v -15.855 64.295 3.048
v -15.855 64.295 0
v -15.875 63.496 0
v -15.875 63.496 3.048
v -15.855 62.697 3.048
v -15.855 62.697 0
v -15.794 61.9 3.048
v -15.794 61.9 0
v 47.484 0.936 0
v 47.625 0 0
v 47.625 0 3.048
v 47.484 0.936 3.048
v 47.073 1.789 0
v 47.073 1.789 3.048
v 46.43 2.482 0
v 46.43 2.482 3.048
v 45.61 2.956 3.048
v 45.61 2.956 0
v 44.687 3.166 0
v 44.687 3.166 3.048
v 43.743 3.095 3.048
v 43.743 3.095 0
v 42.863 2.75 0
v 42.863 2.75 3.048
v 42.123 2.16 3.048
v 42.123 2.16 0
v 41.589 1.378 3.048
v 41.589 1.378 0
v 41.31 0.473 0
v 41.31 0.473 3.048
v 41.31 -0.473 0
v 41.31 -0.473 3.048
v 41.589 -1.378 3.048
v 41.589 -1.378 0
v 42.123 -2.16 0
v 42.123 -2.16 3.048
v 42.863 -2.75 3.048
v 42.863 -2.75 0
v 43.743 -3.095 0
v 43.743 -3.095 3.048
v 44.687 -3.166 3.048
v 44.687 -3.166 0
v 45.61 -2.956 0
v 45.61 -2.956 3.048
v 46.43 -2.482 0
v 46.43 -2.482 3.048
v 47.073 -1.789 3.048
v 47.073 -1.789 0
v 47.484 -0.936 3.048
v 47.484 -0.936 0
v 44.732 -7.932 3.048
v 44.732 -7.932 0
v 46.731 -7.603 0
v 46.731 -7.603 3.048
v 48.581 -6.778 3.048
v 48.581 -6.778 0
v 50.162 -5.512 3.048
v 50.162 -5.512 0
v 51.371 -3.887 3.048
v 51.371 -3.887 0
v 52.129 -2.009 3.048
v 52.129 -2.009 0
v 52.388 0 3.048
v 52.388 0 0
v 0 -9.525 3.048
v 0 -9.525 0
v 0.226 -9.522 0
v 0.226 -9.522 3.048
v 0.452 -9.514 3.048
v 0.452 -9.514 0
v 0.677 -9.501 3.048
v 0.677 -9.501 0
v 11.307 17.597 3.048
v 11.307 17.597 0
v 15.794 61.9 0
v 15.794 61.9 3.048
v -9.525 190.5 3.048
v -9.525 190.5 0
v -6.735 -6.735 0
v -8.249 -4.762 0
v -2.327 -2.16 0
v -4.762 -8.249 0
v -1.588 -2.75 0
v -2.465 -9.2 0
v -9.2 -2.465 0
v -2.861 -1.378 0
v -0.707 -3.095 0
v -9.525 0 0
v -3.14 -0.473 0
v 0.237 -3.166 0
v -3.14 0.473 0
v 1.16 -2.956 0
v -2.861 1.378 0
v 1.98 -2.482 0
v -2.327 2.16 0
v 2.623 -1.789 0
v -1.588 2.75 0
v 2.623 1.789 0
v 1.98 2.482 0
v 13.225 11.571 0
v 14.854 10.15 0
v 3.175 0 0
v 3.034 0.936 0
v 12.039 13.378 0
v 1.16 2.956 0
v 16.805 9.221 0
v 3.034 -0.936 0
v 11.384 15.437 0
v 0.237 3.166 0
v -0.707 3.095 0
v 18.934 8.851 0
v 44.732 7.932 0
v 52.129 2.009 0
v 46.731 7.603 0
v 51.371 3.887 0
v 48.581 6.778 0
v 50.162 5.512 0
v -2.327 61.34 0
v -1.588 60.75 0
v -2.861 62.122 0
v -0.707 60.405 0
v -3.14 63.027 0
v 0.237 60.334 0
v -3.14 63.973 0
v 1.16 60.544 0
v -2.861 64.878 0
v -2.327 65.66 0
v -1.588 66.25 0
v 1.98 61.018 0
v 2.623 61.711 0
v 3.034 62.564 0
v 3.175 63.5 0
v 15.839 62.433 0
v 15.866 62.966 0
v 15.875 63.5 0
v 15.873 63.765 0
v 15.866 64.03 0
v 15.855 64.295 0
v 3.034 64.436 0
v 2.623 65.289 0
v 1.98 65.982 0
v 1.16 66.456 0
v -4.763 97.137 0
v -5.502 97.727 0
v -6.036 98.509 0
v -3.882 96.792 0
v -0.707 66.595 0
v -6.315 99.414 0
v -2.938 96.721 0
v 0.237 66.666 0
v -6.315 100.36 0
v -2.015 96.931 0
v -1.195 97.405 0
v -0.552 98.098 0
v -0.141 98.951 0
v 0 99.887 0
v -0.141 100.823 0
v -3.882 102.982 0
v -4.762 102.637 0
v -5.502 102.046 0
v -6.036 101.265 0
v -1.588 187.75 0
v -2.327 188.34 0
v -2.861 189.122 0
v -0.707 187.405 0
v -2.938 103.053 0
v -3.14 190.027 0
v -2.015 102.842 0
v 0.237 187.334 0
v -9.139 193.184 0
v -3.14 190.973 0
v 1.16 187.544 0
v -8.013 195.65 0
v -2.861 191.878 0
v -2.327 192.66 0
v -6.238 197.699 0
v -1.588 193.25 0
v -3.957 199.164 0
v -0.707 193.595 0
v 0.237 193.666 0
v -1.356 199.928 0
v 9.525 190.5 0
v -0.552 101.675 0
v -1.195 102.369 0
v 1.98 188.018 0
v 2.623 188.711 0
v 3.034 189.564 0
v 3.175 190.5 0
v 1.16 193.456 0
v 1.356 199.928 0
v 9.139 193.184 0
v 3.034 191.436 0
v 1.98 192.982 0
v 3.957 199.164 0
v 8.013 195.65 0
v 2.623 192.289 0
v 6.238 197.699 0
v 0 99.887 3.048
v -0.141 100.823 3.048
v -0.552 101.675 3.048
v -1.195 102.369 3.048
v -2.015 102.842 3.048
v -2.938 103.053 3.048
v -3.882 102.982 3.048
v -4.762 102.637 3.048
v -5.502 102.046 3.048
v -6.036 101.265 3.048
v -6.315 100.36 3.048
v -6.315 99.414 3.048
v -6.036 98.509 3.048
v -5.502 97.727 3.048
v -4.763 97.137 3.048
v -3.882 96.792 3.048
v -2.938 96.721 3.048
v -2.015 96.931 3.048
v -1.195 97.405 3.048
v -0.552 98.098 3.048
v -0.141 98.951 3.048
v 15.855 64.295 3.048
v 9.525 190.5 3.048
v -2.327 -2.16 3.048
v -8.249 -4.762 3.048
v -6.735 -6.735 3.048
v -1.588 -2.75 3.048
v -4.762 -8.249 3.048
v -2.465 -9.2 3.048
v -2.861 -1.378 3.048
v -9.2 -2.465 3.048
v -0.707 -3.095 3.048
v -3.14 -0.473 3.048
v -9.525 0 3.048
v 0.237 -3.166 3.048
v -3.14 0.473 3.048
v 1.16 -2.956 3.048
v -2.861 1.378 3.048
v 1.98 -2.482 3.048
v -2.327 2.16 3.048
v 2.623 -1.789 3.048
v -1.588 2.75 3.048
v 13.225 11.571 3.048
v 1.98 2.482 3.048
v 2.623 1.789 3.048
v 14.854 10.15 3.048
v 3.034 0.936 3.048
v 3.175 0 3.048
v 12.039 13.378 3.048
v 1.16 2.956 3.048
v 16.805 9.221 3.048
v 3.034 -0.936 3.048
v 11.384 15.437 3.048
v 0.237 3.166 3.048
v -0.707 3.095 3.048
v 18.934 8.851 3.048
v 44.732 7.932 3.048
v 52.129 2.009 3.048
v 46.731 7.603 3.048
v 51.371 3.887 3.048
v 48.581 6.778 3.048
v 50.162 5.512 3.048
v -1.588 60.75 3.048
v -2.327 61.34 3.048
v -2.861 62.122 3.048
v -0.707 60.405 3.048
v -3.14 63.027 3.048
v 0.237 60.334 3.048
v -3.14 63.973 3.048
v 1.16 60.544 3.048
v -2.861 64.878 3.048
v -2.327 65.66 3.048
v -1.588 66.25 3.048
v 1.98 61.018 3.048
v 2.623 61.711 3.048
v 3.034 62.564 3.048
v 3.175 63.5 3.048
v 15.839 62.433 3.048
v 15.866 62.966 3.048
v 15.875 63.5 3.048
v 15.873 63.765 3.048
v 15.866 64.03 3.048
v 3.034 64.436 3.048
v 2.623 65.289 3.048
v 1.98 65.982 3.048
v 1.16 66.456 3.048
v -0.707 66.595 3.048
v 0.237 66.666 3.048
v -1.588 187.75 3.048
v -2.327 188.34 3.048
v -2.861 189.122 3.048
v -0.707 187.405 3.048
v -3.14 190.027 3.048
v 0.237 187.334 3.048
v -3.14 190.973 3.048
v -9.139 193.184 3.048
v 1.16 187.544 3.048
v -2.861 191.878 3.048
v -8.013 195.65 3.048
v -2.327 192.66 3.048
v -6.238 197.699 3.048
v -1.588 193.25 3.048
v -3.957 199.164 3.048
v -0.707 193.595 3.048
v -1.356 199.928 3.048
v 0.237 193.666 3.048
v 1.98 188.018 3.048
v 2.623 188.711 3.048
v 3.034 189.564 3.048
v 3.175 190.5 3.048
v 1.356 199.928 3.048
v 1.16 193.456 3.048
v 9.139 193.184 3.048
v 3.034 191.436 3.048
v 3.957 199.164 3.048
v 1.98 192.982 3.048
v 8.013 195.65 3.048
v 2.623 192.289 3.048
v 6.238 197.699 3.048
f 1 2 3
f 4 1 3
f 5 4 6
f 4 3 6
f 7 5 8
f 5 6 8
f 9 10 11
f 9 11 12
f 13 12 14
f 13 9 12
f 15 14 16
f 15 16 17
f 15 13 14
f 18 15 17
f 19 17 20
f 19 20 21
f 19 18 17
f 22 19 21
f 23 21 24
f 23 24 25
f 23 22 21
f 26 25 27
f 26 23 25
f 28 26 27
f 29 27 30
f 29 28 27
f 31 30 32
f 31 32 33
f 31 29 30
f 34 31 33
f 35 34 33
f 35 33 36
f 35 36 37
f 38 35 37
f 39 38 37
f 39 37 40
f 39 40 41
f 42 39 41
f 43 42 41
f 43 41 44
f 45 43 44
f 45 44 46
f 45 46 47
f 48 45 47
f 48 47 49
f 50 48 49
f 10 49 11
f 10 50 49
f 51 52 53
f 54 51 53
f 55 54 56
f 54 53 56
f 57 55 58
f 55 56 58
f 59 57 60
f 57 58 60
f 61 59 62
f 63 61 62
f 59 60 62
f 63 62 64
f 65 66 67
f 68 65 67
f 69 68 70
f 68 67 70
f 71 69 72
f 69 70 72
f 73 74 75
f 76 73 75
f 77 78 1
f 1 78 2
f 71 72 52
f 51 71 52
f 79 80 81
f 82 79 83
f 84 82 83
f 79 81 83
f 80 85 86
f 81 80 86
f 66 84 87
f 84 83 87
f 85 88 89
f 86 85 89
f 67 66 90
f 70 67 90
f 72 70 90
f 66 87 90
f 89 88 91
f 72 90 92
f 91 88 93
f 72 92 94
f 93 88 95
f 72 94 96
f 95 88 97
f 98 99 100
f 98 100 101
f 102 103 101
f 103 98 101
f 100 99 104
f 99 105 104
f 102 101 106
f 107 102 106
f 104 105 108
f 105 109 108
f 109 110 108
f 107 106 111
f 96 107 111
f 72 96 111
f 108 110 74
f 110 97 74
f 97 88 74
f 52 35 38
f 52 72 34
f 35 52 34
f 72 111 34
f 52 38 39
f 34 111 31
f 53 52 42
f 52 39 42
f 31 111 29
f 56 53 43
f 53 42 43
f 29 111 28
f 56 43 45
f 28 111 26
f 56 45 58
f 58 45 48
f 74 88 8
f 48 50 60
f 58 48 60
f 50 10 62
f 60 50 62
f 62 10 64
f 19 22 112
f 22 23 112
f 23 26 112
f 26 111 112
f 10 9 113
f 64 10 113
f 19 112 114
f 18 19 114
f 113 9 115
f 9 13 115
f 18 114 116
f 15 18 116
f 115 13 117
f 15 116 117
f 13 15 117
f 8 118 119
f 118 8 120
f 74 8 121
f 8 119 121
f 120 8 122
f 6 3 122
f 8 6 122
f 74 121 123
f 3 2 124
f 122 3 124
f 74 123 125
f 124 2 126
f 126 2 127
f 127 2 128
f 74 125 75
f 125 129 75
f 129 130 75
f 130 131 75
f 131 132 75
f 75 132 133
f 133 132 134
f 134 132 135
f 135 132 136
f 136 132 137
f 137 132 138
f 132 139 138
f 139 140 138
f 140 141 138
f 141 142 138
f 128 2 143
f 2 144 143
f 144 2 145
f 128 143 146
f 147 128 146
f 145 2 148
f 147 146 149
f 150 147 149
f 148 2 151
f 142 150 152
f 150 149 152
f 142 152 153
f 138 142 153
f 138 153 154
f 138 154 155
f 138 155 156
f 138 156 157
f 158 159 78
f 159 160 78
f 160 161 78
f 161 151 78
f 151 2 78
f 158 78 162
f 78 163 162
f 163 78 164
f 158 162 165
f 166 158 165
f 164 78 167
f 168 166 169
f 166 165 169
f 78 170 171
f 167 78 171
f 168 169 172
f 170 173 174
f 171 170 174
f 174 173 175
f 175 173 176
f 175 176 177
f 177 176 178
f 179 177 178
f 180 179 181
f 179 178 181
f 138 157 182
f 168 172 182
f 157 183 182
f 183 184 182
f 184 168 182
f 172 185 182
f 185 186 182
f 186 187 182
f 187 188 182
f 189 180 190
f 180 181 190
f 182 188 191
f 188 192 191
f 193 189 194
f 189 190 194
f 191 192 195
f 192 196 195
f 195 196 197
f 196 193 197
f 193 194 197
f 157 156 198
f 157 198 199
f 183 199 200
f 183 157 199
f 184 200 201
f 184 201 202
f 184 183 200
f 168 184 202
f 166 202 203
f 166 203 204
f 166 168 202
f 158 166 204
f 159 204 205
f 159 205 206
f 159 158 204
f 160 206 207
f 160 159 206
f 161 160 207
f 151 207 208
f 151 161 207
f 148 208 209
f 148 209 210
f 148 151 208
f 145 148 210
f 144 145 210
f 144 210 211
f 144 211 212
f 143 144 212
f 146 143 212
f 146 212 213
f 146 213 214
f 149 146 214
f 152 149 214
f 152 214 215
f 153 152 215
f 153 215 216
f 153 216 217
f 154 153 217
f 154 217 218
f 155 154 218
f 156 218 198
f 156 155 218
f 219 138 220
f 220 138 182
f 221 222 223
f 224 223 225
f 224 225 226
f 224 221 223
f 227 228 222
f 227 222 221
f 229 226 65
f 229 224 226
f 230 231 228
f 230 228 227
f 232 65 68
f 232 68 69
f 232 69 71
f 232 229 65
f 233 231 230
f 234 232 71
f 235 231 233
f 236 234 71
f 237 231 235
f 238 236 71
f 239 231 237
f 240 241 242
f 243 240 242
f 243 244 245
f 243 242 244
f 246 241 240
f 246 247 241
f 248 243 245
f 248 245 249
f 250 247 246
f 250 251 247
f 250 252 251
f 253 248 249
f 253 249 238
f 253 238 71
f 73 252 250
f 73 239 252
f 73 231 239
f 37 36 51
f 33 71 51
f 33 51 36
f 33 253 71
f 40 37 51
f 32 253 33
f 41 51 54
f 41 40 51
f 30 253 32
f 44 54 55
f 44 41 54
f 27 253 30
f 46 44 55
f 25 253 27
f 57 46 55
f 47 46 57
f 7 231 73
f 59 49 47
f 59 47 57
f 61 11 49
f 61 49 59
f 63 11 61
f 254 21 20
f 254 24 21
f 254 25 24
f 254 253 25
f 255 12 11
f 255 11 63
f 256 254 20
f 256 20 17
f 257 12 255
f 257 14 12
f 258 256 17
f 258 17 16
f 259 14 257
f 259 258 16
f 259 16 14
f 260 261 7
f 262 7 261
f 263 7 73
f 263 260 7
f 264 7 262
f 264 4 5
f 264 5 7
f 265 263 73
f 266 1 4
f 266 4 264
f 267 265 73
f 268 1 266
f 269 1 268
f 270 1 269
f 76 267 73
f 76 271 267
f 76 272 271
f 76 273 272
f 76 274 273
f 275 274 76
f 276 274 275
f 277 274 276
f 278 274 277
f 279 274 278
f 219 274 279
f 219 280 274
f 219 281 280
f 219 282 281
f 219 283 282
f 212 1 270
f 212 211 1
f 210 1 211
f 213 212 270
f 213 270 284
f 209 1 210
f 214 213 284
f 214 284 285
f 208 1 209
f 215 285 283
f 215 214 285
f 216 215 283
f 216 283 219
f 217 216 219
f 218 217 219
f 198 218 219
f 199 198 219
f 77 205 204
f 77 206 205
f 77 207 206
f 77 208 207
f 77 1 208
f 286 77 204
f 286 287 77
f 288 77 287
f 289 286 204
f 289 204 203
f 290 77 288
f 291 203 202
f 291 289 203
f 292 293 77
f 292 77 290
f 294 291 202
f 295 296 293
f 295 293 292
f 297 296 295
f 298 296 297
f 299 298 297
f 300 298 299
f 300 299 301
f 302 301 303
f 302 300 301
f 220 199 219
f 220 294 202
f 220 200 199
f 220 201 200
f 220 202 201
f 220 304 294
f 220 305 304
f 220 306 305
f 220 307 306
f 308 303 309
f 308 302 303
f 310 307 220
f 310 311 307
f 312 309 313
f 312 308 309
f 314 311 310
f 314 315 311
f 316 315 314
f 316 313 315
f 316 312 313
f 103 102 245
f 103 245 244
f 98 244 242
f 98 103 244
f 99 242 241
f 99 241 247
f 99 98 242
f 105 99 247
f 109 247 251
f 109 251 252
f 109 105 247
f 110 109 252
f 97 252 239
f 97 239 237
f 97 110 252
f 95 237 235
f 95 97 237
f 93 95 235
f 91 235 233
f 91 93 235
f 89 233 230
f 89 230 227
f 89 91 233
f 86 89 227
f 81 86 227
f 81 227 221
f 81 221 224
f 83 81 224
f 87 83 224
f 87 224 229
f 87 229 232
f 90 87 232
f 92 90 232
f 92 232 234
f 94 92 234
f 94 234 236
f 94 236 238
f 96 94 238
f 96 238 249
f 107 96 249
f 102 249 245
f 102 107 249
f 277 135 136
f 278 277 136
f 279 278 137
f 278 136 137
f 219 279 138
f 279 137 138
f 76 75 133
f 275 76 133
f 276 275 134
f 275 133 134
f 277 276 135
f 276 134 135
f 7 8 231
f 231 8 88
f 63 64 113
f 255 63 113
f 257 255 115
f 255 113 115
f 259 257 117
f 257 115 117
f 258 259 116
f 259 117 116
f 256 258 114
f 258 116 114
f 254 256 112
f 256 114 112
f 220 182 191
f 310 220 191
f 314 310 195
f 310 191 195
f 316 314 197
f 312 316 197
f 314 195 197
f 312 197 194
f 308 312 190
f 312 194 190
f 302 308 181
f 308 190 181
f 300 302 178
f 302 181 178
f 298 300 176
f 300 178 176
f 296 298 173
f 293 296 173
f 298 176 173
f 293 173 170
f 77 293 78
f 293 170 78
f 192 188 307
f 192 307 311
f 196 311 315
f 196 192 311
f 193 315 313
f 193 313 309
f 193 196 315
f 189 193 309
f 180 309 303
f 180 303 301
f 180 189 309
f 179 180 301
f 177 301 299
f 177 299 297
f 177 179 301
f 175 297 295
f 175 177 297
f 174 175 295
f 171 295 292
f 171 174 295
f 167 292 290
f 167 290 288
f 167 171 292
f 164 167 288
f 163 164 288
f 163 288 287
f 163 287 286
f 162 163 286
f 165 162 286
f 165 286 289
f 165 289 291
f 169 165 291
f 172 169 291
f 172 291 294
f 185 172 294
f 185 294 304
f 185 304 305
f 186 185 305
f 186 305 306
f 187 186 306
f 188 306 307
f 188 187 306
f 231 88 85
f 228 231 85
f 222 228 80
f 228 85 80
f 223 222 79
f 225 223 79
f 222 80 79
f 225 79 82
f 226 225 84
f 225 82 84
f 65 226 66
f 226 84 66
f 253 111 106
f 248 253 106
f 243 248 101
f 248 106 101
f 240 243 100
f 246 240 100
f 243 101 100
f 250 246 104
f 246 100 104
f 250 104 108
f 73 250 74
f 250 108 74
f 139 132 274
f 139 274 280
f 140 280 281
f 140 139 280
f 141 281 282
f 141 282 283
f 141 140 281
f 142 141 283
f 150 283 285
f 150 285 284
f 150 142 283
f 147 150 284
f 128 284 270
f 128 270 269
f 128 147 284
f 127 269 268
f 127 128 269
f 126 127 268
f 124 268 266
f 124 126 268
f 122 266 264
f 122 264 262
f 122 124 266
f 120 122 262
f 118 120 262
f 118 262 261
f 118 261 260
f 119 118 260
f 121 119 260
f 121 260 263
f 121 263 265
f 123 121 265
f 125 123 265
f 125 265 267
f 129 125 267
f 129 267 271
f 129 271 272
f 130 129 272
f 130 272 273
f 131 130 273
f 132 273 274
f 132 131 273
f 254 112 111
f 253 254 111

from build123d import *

# Parameters (mm, degrees)
F0_R     = 3.175
F1_DEPTH = 3.048


with BuildPart() as f1:
    # F0 (on Top) → F1 (new body)
    with BuildSketch(Plane.XY):
        with BuildLine():
            ThreePointArc((-9.525, 190.5), (0, 180.975), (9.525, 190.5))
            ThreePointArc((9.525, 190.5), (0, 200.025), (-9.525, 190.5))
        make_face()
        with Locations((0, 190.5)):
            Circle(F0_R, mode=Mode.SUBTRACT)
        with BuildLine():
            Line((15.855069, 64.295245), (9.525, 190.5))
            ThreePointArc((9.525, 190.5), (0, 180.975), (-9.525, 190.5))
            Line((-9.525, 190.5), (-15.855069, 64.295245))
            ThreePointArc((-15.855069, 64.295245), (0, 79.375), (15.855069, 64.295245))
        make_face()
        with Locations((-3.175, 99.886943)):
            Circle(F0_R, mode=Mode.SUBTRACT)
        with BuildLine():
            ThreePointArc((15.875, 63.5), (15.870016, 63.897747), (15.855069, 64.295245))
            ThreePointArc((15.855069, 64.295245), (0, 79.375), (-15.855069, 64.295245))
            ThreePointArc((-15.855069, 64.295245), (-15.869875, 63.096663), (-15.794203, 61.90038))
            ThreePointArc((-15.794203, 61.90038), (0, 47.625), (15.794203, 61.90038))
            ThreePointArc((15.794203, 61.90038), (15.854788, 62.699171), (15.875, 63.5))
        make_face()
        with Locations((0, 63.5)):
            Circle(F0_R, mode=Mode.SUBTRACT)
        with BuildLine():
            ThreePointArc((15.794203, 61.90038), (0, 47.625), (-15.794203, 61.90038))
            Line((-15.794203, 61.90038), (-9.525, 0))
            ThreePointArc((-9.525, 0), (0, 9.525), (9.525, 0))
            ThreePointArc((9.525, 0), (6.970557, -6.491299), (0.677344, -9.500886))
            Line((0.677344, -9.500886), (44.732405, -7.932475))
            ThreePointArc((44.732405, -7.932475), (36.5125, 0), (44.732405, 7.932475))
            Line((44.732405, 7.932475), (18.934103, 8.850924))
            ThreePointArc((18.934103, 8.850924), (13.224974, 11.57098), (11.307223, 17.59718))
            Line((11.307223, 17.59718), (15.794203, 61.90038))
        make_face()
        with BuildLine():
            ThreePointArc((9.525, 0), (0, 9.525), (-9.525, 0))
            ThreePointArc((-9.525, 0), (-6.735192, -6.735192), (0, -9.525))
            Line((0, -9.525), (0.677344, -9.500886))
            ThreePointArc((0.677344, -9.500886), (6.970557, -6.491299), (9.525, 0))
        make_face()
        Circle(F0_R, mode=Mode.SUBTRACT)
        with BuildLine():
            Line((0.677344, -9.500886), (0, -9.525))
            ThreePointArc((0, -9.525), (0.338886, -9.51897), (0.677344, -9.500886))
        make_face()
        with BuildLine():
            ThreePointArc((52.3875, 0), (50.161633, 5.51191), (44.732405, 7.932475))
            ThreePointArc((44.732405, 7.932475), (36.5125, 0), (44.732405, -7.932475))
            ThreePointArc((44.732405, -7.932475), (50.161633, -5.51191), (52.3875, 0))
        make_face()
        with Locations((44.45, 0)):
            Circle(F0_R, mode=Mode.SUBTRACT)
    extrude(amount=F1_DEPTH)


solid = f1.part
